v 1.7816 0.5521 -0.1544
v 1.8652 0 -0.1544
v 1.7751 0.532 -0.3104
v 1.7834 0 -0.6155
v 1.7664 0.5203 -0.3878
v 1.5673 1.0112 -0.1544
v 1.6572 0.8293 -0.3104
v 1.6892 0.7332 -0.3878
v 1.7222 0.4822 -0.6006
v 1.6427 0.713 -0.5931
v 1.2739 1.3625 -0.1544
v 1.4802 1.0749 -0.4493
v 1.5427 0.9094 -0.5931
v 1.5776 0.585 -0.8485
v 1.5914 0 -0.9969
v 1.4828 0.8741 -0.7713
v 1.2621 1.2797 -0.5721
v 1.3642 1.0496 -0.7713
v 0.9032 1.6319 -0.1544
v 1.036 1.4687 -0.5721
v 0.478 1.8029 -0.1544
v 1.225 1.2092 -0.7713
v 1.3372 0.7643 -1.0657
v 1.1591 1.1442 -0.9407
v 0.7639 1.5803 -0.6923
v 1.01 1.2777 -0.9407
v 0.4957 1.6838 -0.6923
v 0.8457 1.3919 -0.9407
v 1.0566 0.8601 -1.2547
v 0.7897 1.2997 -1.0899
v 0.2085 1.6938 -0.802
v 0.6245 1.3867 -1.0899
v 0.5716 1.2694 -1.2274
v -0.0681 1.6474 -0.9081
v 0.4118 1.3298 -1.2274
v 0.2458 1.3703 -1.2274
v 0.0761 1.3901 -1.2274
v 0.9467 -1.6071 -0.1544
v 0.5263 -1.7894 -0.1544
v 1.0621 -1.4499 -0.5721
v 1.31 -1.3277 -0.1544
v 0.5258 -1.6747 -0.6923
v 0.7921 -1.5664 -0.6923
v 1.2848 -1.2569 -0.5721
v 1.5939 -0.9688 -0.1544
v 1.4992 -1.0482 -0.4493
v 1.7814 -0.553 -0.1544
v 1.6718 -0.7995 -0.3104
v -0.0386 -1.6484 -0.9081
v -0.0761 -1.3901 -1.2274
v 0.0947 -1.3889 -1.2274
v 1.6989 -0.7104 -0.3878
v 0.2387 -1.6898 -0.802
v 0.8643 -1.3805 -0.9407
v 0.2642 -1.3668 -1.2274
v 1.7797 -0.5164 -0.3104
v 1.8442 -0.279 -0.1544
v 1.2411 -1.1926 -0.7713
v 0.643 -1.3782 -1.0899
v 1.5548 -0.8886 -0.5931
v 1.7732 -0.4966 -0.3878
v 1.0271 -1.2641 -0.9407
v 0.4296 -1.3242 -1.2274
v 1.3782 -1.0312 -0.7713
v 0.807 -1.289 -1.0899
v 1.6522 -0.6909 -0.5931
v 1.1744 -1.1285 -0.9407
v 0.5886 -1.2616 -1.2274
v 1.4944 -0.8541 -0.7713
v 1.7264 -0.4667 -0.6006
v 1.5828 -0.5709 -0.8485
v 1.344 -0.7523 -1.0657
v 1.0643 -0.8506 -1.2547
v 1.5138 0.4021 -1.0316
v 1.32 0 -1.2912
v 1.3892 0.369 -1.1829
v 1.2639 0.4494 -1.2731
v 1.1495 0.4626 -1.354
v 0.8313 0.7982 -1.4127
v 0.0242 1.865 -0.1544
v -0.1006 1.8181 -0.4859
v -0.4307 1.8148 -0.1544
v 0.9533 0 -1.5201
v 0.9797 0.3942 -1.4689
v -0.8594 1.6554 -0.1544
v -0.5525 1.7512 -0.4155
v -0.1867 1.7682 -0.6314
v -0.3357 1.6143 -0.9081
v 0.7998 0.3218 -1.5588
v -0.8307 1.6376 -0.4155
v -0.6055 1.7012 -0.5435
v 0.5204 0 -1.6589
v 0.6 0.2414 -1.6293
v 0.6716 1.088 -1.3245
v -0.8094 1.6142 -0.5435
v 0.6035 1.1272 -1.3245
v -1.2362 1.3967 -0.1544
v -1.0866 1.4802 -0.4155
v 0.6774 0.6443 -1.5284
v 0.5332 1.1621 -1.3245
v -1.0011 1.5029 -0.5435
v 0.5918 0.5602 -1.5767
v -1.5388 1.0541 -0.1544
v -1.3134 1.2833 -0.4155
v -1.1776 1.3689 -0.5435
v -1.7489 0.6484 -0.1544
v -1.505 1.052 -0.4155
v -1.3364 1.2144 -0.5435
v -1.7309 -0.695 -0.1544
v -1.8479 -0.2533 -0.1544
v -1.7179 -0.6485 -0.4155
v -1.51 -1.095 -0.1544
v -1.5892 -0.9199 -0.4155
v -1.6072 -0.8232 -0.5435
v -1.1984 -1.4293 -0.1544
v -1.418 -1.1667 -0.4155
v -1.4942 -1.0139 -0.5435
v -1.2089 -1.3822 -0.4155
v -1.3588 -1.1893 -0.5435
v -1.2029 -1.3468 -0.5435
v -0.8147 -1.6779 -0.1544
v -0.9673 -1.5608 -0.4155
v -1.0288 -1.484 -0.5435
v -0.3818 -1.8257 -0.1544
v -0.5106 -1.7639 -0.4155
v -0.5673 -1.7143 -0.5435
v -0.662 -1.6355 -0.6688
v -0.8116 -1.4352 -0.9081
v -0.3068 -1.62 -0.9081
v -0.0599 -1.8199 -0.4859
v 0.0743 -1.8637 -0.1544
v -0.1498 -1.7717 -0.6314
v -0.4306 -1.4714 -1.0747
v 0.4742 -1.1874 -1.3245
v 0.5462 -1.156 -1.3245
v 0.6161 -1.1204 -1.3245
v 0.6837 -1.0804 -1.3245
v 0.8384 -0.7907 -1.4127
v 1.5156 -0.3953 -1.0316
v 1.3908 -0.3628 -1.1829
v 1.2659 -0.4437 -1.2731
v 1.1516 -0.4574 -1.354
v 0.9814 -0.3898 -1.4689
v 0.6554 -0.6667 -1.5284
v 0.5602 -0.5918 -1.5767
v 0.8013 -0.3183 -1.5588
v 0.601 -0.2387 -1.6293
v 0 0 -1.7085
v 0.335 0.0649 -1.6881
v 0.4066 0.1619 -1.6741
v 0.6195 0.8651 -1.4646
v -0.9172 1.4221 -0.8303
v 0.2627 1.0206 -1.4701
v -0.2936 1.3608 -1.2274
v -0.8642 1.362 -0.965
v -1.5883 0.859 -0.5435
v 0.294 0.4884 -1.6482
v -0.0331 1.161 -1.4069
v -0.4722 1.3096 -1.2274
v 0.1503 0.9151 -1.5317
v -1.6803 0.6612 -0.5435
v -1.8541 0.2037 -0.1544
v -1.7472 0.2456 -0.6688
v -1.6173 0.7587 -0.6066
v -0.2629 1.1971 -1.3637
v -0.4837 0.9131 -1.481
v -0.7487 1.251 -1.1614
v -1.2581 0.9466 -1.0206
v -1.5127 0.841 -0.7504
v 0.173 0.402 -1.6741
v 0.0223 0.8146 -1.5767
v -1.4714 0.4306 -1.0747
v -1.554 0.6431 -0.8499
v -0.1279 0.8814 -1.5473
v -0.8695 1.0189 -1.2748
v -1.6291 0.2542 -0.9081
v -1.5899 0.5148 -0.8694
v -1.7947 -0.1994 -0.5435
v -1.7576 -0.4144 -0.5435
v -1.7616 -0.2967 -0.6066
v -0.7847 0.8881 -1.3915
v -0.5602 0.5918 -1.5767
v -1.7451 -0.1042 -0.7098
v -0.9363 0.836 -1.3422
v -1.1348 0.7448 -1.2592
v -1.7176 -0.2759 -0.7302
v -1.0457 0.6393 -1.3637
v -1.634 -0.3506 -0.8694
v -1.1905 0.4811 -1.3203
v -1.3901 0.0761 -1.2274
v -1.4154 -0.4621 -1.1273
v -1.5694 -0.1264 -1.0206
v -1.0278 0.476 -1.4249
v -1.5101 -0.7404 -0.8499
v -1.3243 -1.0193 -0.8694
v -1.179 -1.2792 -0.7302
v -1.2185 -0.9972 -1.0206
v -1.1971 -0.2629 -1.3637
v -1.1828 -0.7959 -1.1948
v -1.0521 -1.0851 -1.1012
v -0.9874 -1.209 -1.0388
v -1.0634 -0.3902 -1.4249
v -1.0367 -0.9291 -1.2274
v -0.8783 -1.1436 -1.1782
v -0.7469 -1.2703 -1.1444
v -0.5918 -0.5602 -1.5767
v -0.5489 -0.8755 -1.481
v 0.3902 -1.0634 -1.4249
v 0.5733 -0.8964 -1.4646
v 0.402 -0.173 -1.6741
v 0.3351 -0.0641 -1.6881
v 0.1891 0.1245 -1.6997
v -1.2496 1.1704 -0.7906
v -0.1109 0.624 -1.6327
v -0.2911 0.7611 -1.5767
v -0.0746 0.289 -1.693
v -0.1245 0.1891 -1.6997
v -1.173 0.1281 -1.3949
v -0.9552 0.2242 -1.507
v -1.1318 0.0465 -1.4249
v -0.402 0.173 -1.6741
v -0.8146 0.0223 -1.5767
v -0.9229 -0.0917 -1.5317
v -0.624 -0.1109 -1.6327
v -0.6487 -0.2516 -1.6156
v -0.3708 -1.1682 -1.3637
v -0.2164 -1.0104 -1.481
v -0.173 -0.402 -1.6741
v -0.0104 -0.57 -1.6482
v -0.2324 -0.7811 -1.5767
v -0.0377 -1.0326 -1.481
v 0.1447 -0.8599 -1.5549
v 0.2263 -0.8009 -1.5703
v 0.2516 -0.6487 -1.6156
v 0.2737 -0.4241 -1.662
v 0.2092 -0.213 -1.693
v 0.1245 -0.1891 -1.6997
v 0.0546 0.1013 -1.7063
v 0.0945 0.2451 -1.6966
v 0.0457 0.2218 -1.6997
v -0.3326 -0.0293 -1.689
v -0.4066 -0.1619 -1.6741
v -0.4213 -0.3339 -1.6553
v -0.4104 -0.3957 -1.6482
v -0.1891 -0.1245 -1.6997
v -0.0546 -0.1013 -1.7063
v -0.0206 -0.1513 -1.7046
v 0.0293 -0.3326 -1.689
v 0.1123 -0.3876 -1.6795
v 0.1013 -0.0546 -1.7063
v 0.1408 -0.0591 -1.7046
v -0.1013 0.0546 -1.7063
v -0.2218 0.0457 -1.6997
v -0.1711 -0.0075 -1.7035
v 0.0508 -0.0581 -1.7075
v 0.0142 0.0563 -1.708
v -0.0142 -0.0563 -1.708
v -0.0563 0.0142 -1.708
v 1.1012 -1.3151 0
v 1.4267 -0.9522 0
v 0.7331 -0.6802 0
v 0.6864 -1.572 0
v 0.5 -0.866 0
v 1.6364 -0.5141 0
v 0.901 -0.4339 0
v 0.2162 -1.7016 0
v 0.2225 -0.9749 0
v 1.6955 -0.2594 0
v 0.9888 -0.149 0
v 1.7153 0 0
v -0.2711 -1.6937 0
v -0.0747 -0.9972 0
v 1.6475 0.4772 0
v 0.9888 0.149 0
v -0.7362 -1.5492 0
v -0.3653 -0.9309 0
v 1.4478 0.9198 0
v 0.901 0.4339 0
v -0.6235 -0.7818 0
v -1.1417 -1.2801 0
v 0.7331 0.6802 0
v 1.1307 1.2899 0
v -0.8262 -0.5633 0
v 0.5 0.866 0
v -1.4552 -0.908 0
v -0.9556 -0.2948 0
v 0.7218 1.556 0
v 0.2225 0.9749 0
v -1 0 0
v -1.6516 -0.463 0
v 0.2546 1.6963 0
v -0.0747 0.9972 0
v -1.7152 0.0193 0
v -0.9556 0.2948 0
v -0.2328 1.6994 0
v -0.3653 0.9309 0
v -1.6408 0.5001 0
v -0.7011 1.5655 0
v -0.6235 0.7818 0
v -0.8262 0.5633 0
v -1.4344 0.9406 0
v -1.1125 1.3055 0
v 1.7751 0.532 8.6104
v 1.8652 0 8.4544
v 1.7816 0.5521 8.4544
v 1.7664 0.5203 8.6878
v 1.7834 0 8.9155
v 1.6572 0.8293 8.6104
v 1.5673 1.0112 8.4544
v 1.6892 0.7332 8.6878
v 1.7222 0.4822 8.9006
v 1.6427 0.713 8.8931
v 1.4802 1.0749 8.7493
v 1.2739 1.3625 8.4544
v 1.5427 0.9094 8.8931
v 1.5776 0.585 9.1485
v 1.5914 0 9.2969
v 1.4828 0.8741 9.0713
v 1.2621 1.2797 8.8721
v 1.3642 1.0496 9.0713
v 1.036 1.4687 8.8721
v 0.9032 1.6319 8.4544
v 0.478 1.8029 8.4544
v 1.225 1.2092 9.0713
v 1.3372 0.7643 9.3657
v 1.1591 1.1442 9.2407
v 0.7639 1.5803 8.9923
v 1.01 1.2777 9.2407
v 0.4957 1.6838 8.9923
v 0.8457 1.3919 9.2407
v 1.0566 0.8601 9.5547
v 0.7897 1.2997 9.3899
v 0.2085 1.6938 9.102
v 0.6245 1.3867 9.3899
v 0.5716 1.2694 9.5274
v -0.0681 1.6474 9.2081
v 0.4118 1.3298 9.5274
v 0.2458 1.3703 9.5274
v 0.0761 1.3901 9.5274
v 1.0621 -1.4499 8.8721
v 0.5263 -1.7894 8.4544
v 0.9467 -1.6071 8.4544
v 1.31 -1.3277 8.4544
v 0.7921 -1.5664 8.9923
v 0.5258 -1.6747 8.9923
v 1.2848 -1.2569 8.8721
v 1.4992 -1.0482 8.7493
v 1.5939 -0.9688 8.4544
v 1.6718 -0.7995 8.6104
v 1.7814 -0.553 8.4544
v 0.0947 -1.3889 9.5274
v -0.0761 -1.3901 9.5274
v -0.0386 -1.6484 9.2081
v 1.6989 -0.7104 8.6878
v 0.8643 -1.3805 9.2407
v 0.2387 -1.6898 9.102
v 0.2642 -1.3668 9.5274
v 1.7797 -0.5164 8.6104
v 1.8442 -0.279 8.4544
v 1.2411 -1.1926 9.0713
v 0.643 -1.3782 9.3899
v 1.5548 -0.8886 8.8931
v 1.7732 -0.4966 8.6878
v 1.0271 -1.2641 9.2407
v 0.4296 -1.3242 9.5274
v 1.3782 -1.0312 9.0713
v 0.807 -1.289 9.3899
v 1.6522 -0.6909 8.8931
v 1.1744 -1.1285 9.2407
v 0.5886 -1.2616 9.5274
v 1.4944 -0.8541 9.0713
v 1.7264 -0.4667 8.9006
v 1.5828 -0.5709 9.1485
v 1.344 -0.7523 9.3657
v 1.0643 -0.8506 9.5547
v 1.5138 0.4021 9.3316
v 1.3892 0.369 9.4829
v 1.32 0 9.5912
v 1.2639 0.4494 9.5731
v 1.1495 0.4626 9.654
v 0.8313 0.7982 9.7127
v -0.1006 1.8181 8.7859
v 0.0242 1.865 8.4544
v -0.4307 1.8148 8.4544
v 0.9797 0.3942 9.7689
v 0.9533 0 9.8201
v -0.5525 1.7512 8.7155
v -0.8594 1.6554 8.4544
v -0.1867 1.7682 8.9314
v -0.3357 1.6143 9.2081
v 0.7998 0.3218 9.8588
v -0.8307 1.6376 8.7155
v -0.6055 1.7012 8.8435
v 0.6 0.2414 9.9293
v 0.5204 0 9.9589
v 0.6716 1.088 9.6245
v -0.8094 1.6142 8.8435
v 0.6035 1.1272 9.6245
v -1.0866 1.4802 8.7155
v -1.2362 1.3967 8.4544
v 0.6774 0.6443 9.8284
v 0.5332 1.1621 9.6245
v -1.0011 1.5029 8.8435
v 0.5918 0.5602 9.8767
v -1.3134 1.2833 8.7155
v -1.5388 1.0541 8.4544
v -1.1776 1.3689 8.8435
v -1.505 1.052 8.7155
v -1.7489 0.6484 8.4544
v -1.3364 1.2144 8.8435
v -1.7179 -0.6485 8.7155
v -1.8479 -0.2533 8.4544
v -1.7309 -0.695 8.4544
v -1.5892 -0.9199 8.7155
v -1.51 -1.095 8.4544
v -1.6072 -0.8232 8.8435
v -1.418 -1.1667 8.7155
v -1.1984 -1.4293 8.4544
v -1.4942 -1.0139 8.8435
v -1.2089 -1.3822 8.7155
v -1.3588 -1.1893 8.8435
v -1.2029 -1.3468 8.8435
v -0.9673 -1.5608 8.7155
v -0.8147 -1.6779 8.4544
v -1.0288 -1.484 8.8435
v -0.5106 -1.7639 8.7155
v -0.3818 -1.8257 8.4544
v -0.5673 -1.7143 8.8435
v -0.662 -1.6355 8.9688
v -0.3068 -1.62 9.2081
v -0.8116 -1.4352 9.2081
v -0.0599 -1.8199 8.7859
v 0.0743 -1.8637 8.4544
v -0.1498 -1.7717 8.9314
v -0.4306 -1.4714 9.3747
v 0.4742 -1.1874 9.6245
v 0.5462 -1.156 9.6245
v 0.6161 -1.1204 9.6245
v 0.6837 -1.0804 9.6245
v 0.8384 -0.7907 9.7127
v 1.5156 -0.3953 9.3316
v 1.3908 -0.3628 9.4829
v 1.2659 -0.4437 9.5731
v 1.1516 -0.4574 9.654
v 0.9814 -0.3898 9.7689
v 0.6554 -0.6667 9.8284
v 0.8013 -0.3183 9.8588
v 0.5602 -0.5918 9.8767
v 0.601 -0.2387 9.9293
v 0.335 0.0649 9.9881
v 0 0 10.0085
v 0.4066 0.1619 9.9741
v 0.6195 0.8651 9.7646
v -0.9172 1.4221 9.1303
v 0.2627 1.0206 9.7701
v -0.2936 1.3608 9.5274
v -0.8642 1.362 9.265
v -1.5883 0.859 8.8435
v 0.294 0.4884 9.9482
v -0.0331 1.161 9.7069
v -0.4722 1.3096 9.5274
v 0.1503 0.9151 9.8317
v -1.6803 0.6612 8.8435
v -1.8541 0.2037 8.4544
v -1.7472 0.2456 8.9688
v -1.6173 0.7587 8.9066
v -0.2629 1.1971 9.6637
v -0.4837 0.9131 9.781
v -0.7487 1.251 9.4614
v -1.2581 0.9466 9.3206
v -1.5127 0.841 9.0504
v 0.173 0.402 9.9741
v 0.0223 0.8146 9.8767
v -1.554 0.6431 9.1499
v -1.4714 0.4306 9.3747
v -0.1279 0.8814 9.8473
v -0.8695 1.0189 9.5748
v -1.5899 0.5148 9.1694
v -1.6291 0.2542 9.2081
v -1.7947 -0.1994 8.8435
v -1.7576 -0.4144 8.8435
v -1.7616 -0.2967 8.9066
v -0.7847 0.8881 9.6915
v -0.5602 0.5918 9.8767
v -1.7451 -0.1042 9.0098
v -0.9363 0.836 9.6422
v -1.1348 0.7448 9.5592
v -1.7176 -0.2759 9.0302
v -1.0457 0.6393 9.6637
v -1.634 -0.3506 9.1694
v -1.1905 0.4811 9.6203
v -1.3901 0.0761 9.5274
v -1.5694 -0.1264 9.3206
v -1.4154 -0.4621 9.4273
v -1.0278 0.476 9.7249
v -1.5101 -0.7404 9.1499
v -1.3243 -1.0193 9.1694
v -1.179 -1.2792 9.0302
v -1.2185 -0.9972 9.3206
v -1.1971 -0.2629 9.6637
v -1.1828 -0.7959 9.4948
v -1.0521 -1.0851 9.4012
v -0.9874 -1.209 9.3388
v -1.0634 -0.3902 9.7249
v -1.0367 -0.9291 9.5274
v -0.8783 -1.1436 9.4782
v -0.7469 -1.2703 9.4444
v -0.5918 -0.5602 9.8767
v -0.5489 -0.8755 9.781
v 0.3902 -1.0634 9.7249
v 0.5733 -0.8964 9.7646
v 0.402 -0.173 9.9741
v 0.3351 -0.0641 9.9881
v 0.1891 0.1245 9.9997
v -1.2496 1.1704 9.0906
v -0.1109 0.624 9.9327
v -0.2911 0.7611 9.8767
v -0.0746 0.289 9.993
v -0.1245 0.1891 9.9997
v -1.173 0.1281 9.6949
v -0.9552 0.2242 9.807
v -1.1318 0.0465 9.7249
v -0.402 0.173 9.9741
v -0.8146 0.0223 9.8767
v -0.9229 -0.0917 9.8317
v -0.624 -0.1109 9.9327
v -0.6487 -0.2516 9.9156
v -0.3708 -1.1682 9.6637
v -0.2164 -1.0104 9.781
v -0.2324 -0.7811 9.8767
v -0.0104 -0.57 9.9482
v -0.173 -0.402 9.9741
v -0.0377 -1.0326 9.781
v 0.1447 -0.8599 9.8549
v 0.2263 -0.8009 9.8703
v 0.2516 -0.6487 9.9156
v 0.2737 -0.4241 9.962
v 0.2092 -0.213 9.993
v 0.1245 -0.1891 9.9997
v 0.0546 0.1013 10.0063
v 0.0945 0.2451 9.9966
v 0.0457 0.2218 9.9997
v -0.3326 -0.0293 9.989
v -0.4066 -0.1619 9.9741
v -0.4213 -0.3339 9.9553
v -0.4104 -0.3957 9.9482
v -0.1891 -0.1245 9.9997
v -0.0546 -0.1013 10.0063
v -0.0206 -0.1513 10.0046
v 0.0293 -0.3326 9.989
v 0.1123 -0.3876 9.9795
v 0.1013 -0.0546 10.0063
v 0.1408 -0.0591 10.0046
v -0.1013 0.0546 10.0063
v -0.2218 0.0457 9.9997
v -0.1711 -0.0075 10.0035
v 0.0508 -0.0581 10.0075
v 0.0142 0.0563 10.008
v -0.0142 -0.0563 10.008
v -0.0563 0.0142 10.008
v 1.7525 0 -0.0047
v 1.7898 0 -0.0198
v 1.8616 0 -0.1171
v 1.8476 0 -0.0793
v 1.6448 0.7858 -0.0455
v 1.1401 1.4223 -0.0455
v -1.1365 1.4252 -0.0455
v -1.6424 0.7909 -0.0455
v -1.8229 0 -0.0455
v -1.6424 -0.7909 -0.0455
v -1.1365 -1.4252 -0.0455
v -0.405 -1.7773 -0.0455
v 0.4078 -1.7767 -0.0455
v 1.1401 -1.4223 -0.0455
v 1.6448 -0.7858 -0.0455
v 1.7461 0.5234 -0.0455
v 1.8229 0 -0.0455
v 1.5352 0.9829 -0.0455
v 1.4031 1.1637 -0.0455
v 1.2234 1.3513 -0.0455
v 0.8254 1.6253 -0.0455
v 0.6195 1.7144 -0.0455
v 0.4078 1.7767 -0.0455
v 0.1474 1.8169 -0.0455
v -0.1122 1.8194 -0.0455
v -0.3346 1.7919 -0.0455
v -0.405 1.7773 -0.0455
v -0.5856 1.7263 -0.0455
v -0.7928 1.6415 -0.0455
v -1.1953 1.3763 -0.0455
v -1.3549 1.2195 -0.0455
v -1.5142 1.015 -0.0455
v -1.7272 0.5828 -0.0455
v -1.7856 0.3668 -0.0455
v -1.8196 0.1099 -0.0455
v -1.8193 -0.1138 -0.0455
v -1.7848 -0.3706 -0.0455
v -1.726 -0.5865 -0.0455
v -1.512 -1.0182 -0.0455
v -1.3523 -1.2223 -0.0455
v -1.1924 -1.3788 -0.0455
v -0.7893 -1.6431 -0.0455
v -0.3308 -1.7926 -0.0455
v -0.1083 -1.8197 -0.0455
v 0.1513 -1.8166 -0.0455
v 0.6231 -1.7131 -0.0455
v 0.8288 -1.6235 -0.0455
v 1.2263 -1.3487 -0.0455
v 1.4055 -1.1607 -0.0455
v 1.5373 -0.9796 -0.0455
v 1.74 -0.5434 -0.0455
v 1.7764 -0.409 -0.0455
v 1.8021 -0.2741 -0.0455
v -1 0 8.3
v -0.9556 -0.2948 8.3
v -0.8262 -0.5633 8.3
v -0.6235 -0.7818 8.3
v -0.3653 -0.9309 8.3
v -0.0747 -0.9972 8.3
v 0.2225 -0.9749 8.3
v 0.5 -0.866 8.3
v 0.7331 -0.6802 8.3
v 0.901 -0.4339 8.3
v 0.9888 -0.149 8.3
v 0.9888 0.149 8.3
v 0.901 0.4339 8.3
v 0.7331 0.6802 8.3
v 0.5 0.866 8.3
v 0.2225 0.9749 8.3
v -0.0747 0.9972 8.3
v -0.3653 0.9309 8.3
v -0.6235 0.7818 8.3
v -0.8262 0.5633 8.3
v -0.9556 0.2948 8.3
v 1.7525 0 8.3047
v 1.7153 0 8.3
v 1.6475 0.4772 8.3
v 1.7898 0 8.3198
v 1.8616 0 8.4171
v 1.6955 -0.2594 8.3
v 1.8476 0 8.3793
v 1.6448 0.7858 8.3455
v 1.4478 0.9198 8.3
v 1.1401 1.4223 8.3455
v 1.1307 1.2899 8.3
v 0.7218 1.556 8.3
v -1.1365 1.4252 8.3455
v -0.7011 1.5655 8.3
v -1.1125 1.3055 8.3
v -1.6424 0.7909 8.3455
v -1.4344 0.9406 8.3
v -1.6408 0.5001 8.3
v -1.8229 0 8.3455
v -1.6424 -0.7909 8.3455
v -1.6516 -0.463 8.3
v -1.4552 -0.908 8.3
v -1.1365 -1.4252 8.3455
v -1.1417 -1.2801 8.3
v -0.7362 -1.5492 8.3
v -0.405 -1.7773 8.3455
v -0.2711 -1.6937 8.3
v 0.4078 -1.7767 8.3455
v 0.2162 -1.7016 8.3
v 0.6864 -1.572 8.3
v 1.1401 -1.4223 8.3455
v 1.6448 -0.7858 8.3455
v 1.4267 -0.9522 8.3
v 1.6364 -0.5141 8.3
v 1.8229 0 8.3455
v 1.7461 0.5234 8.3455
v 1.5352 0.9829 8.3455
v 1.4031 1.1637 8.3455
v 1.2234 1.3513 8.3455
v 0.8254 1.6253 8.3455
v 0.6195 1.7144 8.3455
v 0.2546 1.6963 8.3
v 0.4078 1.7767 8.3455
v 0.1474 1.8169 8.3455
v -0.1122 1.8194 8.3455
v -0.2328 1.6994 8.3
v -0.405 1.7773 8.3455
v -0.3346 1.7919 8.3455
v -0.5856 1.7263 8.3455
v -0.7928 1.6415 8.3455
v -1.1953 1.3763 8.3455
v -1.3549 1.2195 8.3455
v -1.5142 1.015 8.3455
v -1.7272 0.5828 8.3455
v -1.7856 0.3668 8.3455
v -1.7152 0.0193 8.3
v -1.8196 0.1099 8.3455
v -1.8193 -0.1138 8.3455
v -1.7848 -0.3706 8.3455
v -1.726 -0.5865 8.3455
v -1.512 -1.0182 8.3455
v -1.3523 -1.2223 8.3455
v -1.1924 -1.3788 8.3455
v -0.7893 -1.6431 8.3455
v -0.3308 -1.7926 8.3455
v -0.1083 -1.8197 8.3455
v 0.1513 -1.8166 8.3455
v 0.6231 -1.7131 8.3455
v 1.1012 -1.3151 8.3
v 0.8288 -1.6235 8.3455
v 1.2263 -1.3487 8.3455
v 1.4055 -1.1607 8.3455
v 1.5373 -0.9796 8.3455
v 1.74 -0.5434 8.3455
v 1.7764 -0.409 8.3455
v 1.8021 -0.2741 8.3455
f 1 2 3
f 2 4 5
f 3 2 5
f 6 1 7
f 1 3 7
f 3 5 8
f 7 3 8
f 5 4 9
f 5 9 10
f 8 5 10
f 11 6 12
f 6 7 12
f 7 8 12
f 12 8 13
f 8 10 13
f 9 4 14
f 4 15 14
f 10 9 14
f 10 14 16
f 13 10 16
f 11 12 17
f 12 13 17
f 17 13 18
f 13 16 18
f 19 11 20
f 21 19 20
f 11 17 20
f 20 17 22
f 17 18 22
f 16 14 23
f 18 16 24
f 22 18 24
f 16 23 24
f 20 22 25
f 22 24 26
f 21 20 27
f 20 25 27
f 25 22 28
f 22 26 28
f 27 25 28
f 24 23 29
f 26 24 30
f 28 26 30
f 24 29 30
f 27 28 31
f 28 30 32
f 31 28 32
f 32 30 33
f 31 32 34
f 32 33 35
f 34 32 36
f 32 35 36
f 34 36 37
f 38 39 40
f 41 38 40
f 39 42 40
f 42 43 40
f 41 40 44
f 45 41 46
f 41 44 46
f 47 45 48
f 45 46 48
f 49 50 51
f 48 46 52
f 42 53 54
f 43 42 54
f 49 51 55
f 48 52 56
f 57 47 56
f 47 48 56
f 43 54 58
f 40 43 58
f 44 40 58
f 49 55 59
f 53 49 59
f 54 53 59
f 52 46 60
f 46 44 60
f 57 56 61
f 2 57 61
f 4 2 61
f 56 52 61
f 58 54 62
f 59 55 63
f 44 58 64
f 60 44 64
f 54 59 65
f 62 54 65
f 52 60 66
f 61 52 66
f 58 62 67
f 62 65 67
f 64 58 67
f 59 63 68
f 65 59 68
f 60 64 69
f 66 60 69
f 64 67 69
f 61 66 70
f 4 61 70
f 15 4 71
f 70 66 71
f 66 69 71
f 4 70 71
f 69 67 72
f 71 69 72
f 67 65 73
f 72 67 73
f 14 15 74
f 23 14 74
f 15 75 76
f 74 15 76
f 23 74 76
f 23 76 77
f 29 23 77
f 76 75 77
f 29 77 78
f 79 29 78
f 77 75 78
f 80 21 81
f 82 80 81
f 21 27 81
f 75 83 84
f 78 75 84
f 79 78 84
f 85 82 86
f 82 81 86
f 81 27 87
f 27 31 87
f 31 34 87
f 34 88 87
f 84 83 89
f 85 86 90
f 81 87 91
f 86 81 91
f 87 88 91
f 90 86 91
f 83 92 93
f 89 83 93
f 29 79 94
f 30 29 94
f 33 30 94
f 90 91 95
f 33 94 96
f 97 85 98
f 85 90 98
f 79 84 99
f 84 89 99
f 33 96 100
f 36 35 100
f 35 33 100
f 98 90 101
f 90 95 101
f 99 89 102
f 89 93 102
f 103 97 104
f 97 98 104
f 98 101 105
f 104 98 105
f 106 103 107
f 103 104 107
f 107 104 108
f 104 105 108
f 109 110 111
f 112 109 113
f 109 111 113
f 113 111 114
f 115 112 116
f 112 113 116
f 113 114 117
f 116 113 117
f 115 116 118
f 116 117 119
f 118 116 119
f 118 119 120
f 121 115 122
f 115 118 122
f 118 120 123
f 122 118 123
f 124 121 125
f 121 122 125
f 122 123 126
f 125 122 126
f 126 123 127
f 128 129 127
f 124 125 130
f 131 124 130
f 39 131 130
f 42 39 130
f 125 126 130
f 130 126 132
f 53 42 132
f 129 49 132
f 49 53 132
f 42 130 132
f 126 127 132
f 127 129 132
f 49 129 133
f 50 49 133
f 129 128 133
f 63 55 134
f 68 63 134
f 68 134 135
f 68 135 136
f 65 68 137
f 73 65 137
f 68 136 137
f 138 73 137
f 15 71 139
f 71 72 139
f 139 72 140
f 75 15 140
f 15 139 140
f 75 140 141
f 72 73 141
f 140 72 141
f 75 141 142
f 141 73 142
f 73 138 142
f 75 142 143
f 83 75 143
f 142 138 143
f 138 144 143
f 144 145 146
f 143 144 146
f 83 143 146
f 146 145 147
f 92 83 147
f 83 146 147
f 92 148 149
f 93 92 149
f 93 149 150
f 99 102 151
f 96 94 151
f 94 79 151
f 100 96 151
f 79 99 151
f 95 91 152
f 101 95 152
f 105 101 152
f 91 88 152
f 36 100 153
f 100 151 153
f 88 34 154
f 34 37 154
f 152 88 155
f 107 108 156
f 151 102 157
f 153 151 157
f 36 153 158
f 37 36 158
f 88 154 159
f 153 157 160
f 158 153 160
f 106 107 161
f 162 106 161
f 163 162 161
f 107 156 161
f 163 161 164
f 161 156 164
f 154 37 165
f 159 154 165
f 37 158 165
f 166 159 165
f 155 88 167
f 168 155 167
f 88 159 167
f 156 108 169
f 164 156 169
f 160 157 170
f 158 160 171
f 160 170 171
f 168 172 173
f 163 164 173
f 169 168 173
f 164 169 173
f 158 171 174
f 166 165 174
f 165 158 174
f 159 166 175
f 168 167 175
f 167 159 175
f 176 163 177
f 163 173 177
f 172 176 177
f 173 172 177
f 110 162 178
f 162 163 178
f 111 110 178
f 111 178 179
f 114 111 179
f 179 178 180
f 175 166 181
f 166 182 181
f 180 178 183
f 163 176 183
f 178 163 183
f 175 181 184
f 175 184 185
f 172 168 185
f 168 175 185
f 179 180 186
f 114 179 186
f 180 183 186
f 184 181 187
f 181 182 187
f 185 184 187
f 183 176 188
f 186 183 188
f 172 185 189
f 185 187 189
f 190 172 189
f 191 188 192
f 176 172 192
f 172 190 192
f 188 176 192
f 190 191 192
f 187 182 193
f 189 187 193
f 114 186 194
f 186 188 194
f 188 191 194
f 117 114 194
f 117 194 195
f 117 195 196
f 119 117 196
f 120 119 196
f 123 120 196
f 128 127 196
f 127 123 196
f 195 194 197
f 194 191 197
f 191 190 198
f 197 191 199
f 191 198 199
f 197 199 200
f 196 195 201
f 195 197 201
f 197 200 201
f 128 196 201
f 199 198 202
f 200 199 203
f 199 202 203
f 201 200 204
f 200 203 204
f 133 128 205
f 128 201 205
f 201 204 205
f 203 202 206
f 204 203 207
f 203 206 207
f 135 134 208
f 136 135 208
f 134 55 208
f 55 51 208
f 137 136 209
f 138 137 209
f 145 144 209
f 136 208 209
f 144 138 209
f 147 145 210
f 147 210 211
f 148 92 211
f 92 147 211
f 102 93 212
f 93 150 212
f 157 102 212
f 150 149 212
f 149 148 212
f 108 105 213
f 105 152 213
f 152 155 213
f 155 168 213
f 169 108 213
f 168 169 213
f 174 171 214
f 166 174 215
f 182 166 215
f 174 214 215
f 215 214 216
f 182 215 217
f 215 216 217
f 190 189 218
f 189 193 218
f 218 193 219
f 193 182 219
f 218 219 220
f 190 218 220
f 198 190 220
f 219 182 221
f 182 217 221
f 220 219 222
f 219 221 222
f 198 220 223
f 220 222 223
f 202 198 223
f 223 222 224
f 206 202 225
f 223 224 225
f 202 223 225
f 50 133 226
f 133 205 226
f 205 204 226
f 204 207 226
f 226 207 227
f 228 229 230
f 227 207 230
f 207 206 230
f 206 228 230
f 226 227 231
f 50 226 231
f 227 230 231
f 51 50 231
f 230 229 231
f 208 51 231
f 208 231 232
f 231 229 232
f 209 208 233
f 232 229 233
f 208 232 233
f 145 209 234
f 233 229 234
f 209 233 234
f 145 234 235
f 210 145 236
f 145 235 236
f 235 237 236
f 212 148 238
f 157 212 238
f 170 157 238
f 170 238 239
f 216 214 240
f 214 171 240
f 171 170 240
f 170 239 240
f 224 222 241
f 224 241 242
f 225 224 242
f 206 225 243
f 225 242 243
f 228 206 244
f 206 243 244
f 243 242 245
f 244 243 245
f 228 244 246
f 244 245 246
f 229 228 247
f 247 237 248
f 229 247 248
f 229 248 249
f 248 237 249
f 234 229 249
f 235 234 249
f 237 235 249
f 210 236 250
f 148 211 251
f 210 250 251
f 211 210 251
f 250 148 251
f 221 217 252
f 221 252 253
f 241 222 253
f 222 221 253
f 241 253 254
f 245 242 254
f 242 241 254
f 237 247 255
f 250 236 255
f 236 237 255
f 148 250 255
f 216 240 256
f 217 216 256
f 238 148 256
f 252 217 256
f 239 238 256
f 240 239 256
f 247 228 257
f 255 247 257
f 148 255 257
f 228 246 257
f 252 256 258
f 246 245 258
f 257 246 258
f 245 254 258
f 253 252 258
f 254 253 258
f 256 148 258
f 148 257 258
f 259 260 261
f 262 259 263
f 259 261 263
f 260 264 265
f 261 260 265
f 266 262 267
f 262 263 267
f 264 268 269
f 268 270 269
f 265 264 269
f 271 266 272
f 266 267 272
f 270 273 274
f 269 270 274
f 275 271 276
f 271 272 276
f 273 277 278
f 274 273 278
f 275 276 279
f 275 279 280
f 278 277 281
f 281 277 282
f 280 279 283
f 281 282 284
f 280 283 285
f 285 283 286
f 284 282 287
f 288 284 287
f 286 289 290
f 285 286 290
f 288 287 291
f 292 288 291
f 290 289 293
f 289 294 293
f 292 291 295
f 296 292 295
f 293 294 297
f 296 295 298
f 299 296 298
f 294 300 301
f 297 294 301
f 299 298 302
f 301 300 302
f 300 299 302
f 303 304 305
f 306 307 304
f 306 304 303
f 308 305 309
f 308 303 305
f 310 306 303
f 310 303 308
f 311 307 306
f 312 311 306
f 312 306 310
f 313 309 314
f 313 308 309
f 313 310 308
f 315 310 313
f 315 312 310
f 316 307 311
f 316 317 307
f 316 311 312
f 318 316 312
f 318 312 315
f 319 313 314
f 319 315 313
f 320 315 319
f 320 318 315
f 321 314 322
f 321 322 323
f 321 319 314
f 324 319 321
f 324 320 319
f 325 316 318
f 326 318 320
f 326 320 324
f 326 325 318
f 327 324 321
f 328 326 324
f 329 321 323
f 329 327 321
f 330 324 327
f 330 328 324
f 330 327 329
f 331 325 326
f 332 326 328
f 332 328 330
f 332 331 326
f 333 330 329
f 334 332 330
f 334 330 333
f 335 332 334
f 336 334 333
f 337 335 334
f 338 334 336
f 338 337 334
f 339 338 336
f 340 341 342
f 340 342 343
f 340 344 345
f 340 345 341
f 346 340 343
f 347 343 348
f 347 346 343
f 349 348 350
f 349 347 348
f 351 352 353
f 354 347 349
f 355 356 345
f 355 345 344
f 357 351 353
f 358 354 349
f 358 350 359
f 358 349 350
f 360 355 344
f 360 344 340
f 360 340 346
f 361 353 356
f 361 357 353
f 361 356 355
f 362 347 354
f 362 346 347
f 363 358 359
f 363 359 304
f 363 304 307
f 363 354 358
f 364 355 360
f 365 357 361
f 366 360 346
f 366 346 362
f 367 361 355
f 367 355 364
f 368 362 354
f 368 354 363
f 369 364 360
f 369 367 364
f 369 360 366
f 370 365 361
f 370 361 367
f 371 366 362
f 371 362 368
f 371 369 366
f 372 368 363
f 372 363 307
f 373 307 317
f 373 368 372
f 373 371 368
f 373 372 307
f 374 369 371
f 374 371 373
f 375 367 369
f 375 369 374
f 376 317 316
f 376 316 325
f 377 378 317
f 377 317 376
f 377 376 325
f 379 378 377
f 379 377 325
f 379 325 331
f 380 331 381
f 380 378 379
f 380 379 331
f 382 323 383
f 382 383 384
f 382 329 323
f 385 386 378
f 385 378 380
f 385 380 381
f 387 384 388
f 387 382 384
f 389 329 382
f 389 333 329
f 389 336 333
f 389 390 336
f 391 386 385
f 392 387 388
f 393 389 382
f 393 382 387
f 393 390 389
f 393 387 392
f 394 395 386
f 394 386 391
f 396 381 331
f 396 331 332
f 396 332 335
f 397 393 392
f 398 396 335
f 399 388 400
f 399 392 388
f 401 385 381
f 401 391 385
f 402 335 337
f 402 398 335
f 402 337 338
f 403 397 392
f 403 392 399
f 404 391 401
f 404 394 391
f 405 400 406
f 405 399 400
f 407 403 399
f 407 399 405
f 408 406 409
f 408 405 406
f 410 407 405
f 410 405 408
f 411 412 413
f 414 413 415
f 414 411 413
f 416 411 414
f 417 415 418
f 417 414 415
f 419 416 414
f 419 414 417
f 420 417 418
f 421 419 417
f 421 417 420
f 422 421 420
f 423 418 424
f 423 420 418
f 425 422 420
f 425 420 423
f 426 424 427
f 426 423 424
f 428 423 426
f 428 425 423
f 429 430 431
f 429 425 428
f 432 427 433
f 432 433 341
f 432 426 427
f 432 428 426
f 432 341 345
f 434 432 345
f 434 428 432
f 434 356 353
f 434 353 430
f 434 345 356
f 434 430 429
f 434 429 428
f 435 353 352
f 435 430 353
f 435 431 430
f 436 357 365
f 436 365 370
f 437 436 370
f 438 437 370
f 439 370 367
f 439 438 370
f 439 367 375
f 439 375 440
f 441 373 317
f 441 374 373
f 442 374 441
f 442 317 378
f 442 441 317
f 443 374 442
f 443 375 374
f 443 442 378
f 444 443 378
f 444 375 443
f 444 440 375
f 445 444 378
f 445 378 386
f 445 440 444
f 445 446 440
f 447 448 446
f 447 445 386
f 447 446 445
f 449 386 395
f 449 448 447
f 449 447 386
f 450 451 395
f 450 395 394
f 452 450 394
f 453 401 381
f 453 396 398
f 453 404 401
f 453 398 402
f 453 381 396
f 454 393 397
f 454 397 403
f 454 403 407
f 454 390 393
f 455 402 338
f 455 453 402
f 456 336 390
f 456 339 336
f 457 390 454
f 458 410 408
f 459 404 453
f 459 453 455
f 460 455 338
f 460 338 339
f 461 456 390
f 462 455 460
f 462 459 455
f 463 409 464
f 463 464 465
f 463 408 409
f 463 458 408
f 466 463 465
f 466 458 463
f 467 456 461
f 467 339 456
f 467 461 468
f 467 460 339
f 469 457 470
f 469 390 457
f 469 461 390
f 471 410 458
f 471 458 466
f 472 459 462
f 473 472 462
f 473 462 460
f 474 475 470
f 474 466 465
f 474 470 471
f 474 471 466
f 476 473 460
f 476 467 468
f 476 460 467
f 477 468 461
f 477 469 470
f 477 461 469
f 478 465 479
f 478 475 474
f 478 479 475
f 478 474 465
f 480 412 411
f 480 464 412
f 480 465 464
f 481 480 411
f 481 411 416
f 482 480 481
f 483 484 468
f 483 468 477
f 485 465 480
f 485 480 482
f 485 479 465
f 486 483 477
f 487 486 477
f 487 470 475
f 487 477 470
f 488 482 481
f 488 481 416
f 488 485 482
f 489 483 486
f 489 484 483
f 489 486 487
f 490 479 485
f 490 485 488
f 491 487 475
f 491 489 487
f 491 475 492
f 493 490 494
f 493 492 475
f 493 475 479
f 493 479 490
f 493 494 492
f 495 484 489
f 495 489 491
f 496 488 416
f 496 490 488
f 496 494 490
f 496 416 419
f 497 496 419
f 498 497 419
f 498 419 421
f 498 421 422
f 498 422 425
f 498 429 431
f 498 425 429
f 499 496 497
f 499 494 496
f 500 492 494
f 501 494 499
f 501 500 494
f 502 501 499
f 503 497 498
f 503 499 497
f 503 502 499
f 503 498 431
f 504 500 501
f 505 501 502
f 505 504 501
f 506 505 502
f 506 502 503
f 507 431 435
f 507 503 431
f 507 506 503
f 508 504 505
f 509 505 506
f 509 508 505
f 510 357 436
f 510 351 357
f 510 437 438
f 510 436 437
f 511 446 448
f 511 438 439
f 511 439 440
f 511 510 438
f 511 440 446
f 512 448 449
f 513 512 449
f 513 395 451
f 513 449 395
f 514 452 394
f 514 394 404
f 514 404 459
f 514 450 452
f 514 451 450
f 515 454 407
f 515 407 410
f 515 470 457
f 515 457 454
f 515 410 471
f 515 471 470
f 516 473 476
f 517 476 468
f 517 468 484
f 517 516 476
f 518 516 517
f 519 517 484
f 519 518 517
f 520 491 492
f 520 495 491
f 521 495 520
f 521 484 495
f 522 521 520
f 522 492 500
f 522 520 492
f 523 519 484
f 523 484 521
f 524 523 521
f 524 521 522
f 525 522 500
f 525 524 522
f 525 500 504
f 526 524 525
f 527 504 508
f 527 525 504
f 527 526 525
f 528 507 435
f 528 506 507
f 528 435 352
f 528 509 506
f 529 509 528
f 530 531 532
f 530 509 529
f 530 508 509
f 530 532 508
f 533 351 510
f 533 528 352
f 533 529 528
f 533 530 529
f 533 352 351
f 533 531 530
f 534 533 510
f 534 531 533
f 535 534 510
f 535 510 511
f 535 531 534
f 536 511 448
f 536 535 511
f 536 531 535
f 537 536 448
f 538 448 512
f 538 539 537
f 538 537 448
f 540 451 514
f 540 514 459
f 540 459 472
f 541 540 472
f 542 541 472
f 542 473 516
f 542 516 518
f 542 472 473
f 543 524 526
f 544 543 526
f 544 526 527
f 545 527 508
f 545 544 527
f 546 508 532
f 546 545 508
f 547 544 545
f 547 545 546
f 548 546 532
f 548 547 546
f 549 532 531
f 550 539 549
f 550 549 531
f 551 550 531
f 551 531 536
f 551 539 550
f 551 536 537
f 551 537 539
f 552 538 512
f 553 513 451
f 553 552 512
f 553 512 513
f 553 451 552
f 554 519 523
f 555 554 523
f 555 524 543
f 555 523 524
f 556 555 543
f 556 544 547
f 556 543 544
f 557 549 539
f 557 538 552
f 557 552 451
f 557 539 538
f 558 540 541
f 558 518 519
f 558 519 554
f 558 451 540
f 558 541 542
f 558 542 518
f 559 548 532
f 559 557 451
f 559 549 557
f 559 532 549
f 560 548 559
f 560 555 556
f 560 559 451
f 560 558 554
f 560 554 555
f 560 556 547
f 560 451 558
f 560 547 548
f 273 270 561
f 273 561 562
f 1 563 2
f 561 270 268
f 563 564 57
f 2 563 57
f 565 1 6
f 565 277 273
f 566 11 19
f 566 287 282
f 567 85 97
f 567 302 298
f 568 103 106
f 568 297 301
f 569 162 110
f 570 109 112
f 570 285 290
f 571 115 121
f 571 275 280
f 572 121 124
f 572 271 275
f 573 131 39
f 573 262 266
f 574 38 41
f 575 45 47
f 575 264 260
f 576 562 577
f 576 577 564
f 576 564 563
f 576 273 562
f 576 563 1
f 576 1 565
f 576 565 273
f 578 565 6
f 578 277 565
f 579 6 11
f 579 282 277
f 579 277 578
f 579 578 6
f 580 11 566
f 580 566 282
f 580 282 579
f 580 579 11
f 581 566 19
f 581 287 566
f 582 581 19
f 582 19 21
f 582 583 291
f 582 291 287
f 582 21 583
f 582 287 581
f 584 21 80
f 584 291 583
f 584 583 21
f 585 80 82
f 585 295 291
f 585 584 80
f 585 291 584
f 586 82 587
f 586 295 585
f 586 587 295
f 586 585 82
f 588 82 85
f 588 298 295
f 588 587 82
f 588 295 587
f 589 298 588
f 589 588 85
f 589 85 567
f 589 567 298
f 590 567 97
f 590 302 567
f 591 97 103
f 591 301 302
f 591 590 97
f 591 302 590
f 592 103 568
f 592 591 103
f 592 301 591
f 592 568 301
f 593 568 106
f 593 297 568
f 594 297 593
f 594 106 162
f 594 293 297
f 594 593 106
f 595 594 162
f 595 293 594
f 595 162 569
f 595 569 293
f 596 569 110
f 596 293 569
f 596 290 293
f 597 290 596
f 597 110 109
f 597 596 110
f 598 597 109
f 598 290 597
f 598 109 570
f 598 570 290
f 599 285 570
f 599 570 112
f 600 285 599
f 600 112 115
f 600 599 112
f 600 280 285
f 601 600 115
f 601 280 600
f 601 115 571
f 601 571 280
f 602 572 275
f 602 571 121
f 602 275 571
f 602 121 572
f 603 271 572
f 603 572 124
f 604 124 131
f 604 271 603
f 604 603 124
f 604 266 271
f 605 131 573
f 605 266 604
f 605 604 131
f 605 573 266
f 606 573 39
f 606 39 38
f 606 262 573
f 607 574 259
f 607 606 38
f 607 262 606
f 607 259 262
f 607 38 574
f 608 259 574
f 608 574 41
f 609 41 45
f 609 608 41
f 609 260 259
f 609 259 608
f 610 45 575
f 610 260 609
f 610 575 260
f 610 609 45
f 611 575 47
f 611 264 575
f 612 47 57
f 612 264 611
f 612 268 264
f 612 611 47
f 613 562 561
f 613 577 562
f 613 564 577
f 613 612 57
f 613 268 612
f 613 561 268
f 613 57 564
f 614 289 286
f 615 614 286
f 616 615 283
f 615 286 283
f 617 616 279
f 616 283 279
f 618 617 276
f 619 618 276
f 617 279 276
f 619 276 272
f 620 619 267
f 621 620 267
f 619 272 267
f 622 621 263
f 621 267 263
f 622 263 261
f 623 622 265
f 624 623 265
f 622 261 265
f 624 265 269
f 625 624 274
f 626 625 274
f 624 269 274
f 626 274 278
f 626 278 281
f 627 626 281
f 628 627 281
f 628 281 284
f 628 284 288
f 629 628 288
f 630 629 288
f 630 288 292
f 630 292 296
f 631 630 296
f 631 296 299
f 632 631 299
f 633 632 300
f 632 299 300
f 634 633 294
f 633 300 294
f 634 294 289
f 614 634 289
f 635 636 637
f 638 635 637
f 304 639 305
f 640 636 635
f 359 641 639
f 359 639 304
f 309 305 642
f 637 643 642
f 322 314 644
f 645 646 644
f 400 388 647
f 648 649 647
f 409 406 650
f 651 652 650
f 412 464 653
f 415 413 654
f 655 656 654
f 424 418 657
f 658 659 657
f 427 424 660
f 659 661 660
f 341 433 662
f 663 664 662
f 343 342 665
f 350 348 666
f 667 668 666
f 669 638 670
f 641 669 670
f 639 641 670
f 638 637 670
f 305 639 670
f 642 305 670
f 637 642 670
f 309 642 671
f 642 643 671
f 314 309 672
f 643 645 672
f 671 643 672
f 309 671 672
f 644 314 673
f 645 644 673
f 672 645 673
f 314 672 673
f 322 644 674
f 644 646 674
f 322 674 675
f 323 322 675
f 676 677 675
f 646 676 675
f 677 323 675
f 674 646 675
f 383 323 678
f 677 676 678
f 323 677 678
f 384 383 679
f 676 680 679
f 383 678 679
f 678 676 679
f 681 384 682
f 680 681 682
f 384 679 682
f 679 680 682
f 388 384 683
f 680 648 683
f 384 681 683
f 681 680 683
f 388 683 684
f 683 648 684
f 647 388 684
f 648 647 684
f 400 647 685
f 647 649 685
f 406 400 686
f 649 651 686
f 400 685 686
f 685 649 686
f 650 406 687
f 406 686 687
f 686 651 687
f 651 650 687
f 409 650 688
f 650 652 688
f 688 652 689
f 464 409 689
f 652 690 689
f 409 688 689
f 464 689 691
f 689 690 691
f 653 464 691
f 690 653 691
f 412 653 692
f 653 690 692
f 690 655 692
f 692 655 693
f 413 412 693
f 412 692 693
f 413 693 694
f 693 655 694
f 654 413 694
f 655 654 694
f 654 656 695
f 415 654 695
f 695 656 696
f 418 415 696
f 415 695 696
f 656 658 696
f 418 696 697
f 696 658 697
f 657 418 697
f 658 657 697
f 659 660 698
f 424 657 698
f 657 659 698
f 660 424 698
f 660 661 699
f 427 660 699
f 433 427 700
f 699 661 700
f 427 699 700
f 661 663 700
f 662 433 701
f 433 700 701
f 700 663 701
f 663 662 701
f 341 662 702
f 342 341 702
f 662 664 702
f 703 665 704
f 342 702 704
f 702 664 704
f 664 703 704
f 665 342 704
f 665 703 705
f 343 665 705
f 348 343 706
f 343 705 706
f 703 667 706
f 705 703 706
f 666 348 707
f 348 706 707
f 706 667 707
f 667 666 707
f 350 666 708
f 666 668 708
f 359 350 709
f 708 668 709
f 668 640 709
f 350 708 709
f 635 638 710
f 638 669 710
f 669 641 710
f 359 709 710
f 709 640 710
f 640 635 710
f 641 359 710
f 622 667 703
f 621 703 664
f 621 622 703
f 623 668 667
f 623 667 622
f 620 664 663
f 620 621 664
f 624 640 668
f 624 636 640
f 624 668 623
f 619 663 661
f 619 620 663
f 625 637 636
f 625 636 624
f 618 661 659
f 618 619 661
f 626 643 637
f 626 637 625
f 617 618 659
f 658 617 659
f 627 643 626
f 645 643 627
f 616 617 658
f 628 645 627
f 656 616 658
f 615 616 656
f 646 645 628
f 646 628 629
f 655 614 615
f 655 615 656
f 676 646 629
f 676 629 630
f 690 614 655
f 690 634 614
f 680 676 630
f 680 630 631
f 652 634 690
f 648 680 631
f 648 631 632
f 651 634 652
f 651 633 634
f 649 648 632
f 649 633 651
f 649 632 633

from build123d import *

# Parameters (mm, degrees)
SKETCH1_R           = 1
BOSS_EXTRUDE1_DEPTH = 8.3
FILLET1_R           = 0.15
FILLET2_R           = 0.15


with BuildPart() as part:
    # Sketch1 → Boss-Extrude1 (new body)
    with BuildSketch(Plane.XY):
        with Locations(Location((0, 0, 0), (0, 0, 180))):
            Circle(SKETCH1_R)
    extrude(amount=BOSS_EXTRUDE1_DEPTH)

    # Sketch2 → Revolve1 (revolve)
    with BuildSketch(Plane(origin=(0, 0, 0), x_dir=(1, 0, 0), z_dir=(0, 1, 0))):
        with BuildLine():
            Line((0, 0), (1.86246764, 0))
            add(Edge.make_bspline(
                [(1.86246764, 0), (1.916751975, 0.840718666), (1.329815324, 1.708509957), (0, 1.708509957)],
                knots=[0, 0, 0, 0, 1, 1, 1, 1], degree=3))
            Line((0, 1.708509957), (0, 0))
        make_face()
        with BuildLine():
            Line((0, -8.3), (1.86246764, -8.3))
            add(Edge.make_bspline(
                [(1.86246764, -8.3), (1.916751975, -9.140718666), (1.329815324, -10.008509957), (0, -10.008509957)],
                knots=[0, 0, 0, 0, 1, 1, 1, 1], degree=3))
            Line((0, -10.008509957), (0, -8.3))
        make_face()
    revolve(axis=Axis((0, 0, -4.836287687), (0, 0, 1)))

    # Fillet1
    fillet1_edges = [part.edges().sort_by_distance(p)[0] for p in [
        (-1.86246764, 0, 8.3),
    ]]
    fillet(fillet1_edges, radius=FILLET1_R)

    # Fillet2
    fillet2_edges = [part.edges().sort_by_distance(p)[0] for p in [
        (-1.86246764, 0, 0),
    ]]
    fillet(fillet2_edges, radius=FILLET2_R)


solid = part.part
